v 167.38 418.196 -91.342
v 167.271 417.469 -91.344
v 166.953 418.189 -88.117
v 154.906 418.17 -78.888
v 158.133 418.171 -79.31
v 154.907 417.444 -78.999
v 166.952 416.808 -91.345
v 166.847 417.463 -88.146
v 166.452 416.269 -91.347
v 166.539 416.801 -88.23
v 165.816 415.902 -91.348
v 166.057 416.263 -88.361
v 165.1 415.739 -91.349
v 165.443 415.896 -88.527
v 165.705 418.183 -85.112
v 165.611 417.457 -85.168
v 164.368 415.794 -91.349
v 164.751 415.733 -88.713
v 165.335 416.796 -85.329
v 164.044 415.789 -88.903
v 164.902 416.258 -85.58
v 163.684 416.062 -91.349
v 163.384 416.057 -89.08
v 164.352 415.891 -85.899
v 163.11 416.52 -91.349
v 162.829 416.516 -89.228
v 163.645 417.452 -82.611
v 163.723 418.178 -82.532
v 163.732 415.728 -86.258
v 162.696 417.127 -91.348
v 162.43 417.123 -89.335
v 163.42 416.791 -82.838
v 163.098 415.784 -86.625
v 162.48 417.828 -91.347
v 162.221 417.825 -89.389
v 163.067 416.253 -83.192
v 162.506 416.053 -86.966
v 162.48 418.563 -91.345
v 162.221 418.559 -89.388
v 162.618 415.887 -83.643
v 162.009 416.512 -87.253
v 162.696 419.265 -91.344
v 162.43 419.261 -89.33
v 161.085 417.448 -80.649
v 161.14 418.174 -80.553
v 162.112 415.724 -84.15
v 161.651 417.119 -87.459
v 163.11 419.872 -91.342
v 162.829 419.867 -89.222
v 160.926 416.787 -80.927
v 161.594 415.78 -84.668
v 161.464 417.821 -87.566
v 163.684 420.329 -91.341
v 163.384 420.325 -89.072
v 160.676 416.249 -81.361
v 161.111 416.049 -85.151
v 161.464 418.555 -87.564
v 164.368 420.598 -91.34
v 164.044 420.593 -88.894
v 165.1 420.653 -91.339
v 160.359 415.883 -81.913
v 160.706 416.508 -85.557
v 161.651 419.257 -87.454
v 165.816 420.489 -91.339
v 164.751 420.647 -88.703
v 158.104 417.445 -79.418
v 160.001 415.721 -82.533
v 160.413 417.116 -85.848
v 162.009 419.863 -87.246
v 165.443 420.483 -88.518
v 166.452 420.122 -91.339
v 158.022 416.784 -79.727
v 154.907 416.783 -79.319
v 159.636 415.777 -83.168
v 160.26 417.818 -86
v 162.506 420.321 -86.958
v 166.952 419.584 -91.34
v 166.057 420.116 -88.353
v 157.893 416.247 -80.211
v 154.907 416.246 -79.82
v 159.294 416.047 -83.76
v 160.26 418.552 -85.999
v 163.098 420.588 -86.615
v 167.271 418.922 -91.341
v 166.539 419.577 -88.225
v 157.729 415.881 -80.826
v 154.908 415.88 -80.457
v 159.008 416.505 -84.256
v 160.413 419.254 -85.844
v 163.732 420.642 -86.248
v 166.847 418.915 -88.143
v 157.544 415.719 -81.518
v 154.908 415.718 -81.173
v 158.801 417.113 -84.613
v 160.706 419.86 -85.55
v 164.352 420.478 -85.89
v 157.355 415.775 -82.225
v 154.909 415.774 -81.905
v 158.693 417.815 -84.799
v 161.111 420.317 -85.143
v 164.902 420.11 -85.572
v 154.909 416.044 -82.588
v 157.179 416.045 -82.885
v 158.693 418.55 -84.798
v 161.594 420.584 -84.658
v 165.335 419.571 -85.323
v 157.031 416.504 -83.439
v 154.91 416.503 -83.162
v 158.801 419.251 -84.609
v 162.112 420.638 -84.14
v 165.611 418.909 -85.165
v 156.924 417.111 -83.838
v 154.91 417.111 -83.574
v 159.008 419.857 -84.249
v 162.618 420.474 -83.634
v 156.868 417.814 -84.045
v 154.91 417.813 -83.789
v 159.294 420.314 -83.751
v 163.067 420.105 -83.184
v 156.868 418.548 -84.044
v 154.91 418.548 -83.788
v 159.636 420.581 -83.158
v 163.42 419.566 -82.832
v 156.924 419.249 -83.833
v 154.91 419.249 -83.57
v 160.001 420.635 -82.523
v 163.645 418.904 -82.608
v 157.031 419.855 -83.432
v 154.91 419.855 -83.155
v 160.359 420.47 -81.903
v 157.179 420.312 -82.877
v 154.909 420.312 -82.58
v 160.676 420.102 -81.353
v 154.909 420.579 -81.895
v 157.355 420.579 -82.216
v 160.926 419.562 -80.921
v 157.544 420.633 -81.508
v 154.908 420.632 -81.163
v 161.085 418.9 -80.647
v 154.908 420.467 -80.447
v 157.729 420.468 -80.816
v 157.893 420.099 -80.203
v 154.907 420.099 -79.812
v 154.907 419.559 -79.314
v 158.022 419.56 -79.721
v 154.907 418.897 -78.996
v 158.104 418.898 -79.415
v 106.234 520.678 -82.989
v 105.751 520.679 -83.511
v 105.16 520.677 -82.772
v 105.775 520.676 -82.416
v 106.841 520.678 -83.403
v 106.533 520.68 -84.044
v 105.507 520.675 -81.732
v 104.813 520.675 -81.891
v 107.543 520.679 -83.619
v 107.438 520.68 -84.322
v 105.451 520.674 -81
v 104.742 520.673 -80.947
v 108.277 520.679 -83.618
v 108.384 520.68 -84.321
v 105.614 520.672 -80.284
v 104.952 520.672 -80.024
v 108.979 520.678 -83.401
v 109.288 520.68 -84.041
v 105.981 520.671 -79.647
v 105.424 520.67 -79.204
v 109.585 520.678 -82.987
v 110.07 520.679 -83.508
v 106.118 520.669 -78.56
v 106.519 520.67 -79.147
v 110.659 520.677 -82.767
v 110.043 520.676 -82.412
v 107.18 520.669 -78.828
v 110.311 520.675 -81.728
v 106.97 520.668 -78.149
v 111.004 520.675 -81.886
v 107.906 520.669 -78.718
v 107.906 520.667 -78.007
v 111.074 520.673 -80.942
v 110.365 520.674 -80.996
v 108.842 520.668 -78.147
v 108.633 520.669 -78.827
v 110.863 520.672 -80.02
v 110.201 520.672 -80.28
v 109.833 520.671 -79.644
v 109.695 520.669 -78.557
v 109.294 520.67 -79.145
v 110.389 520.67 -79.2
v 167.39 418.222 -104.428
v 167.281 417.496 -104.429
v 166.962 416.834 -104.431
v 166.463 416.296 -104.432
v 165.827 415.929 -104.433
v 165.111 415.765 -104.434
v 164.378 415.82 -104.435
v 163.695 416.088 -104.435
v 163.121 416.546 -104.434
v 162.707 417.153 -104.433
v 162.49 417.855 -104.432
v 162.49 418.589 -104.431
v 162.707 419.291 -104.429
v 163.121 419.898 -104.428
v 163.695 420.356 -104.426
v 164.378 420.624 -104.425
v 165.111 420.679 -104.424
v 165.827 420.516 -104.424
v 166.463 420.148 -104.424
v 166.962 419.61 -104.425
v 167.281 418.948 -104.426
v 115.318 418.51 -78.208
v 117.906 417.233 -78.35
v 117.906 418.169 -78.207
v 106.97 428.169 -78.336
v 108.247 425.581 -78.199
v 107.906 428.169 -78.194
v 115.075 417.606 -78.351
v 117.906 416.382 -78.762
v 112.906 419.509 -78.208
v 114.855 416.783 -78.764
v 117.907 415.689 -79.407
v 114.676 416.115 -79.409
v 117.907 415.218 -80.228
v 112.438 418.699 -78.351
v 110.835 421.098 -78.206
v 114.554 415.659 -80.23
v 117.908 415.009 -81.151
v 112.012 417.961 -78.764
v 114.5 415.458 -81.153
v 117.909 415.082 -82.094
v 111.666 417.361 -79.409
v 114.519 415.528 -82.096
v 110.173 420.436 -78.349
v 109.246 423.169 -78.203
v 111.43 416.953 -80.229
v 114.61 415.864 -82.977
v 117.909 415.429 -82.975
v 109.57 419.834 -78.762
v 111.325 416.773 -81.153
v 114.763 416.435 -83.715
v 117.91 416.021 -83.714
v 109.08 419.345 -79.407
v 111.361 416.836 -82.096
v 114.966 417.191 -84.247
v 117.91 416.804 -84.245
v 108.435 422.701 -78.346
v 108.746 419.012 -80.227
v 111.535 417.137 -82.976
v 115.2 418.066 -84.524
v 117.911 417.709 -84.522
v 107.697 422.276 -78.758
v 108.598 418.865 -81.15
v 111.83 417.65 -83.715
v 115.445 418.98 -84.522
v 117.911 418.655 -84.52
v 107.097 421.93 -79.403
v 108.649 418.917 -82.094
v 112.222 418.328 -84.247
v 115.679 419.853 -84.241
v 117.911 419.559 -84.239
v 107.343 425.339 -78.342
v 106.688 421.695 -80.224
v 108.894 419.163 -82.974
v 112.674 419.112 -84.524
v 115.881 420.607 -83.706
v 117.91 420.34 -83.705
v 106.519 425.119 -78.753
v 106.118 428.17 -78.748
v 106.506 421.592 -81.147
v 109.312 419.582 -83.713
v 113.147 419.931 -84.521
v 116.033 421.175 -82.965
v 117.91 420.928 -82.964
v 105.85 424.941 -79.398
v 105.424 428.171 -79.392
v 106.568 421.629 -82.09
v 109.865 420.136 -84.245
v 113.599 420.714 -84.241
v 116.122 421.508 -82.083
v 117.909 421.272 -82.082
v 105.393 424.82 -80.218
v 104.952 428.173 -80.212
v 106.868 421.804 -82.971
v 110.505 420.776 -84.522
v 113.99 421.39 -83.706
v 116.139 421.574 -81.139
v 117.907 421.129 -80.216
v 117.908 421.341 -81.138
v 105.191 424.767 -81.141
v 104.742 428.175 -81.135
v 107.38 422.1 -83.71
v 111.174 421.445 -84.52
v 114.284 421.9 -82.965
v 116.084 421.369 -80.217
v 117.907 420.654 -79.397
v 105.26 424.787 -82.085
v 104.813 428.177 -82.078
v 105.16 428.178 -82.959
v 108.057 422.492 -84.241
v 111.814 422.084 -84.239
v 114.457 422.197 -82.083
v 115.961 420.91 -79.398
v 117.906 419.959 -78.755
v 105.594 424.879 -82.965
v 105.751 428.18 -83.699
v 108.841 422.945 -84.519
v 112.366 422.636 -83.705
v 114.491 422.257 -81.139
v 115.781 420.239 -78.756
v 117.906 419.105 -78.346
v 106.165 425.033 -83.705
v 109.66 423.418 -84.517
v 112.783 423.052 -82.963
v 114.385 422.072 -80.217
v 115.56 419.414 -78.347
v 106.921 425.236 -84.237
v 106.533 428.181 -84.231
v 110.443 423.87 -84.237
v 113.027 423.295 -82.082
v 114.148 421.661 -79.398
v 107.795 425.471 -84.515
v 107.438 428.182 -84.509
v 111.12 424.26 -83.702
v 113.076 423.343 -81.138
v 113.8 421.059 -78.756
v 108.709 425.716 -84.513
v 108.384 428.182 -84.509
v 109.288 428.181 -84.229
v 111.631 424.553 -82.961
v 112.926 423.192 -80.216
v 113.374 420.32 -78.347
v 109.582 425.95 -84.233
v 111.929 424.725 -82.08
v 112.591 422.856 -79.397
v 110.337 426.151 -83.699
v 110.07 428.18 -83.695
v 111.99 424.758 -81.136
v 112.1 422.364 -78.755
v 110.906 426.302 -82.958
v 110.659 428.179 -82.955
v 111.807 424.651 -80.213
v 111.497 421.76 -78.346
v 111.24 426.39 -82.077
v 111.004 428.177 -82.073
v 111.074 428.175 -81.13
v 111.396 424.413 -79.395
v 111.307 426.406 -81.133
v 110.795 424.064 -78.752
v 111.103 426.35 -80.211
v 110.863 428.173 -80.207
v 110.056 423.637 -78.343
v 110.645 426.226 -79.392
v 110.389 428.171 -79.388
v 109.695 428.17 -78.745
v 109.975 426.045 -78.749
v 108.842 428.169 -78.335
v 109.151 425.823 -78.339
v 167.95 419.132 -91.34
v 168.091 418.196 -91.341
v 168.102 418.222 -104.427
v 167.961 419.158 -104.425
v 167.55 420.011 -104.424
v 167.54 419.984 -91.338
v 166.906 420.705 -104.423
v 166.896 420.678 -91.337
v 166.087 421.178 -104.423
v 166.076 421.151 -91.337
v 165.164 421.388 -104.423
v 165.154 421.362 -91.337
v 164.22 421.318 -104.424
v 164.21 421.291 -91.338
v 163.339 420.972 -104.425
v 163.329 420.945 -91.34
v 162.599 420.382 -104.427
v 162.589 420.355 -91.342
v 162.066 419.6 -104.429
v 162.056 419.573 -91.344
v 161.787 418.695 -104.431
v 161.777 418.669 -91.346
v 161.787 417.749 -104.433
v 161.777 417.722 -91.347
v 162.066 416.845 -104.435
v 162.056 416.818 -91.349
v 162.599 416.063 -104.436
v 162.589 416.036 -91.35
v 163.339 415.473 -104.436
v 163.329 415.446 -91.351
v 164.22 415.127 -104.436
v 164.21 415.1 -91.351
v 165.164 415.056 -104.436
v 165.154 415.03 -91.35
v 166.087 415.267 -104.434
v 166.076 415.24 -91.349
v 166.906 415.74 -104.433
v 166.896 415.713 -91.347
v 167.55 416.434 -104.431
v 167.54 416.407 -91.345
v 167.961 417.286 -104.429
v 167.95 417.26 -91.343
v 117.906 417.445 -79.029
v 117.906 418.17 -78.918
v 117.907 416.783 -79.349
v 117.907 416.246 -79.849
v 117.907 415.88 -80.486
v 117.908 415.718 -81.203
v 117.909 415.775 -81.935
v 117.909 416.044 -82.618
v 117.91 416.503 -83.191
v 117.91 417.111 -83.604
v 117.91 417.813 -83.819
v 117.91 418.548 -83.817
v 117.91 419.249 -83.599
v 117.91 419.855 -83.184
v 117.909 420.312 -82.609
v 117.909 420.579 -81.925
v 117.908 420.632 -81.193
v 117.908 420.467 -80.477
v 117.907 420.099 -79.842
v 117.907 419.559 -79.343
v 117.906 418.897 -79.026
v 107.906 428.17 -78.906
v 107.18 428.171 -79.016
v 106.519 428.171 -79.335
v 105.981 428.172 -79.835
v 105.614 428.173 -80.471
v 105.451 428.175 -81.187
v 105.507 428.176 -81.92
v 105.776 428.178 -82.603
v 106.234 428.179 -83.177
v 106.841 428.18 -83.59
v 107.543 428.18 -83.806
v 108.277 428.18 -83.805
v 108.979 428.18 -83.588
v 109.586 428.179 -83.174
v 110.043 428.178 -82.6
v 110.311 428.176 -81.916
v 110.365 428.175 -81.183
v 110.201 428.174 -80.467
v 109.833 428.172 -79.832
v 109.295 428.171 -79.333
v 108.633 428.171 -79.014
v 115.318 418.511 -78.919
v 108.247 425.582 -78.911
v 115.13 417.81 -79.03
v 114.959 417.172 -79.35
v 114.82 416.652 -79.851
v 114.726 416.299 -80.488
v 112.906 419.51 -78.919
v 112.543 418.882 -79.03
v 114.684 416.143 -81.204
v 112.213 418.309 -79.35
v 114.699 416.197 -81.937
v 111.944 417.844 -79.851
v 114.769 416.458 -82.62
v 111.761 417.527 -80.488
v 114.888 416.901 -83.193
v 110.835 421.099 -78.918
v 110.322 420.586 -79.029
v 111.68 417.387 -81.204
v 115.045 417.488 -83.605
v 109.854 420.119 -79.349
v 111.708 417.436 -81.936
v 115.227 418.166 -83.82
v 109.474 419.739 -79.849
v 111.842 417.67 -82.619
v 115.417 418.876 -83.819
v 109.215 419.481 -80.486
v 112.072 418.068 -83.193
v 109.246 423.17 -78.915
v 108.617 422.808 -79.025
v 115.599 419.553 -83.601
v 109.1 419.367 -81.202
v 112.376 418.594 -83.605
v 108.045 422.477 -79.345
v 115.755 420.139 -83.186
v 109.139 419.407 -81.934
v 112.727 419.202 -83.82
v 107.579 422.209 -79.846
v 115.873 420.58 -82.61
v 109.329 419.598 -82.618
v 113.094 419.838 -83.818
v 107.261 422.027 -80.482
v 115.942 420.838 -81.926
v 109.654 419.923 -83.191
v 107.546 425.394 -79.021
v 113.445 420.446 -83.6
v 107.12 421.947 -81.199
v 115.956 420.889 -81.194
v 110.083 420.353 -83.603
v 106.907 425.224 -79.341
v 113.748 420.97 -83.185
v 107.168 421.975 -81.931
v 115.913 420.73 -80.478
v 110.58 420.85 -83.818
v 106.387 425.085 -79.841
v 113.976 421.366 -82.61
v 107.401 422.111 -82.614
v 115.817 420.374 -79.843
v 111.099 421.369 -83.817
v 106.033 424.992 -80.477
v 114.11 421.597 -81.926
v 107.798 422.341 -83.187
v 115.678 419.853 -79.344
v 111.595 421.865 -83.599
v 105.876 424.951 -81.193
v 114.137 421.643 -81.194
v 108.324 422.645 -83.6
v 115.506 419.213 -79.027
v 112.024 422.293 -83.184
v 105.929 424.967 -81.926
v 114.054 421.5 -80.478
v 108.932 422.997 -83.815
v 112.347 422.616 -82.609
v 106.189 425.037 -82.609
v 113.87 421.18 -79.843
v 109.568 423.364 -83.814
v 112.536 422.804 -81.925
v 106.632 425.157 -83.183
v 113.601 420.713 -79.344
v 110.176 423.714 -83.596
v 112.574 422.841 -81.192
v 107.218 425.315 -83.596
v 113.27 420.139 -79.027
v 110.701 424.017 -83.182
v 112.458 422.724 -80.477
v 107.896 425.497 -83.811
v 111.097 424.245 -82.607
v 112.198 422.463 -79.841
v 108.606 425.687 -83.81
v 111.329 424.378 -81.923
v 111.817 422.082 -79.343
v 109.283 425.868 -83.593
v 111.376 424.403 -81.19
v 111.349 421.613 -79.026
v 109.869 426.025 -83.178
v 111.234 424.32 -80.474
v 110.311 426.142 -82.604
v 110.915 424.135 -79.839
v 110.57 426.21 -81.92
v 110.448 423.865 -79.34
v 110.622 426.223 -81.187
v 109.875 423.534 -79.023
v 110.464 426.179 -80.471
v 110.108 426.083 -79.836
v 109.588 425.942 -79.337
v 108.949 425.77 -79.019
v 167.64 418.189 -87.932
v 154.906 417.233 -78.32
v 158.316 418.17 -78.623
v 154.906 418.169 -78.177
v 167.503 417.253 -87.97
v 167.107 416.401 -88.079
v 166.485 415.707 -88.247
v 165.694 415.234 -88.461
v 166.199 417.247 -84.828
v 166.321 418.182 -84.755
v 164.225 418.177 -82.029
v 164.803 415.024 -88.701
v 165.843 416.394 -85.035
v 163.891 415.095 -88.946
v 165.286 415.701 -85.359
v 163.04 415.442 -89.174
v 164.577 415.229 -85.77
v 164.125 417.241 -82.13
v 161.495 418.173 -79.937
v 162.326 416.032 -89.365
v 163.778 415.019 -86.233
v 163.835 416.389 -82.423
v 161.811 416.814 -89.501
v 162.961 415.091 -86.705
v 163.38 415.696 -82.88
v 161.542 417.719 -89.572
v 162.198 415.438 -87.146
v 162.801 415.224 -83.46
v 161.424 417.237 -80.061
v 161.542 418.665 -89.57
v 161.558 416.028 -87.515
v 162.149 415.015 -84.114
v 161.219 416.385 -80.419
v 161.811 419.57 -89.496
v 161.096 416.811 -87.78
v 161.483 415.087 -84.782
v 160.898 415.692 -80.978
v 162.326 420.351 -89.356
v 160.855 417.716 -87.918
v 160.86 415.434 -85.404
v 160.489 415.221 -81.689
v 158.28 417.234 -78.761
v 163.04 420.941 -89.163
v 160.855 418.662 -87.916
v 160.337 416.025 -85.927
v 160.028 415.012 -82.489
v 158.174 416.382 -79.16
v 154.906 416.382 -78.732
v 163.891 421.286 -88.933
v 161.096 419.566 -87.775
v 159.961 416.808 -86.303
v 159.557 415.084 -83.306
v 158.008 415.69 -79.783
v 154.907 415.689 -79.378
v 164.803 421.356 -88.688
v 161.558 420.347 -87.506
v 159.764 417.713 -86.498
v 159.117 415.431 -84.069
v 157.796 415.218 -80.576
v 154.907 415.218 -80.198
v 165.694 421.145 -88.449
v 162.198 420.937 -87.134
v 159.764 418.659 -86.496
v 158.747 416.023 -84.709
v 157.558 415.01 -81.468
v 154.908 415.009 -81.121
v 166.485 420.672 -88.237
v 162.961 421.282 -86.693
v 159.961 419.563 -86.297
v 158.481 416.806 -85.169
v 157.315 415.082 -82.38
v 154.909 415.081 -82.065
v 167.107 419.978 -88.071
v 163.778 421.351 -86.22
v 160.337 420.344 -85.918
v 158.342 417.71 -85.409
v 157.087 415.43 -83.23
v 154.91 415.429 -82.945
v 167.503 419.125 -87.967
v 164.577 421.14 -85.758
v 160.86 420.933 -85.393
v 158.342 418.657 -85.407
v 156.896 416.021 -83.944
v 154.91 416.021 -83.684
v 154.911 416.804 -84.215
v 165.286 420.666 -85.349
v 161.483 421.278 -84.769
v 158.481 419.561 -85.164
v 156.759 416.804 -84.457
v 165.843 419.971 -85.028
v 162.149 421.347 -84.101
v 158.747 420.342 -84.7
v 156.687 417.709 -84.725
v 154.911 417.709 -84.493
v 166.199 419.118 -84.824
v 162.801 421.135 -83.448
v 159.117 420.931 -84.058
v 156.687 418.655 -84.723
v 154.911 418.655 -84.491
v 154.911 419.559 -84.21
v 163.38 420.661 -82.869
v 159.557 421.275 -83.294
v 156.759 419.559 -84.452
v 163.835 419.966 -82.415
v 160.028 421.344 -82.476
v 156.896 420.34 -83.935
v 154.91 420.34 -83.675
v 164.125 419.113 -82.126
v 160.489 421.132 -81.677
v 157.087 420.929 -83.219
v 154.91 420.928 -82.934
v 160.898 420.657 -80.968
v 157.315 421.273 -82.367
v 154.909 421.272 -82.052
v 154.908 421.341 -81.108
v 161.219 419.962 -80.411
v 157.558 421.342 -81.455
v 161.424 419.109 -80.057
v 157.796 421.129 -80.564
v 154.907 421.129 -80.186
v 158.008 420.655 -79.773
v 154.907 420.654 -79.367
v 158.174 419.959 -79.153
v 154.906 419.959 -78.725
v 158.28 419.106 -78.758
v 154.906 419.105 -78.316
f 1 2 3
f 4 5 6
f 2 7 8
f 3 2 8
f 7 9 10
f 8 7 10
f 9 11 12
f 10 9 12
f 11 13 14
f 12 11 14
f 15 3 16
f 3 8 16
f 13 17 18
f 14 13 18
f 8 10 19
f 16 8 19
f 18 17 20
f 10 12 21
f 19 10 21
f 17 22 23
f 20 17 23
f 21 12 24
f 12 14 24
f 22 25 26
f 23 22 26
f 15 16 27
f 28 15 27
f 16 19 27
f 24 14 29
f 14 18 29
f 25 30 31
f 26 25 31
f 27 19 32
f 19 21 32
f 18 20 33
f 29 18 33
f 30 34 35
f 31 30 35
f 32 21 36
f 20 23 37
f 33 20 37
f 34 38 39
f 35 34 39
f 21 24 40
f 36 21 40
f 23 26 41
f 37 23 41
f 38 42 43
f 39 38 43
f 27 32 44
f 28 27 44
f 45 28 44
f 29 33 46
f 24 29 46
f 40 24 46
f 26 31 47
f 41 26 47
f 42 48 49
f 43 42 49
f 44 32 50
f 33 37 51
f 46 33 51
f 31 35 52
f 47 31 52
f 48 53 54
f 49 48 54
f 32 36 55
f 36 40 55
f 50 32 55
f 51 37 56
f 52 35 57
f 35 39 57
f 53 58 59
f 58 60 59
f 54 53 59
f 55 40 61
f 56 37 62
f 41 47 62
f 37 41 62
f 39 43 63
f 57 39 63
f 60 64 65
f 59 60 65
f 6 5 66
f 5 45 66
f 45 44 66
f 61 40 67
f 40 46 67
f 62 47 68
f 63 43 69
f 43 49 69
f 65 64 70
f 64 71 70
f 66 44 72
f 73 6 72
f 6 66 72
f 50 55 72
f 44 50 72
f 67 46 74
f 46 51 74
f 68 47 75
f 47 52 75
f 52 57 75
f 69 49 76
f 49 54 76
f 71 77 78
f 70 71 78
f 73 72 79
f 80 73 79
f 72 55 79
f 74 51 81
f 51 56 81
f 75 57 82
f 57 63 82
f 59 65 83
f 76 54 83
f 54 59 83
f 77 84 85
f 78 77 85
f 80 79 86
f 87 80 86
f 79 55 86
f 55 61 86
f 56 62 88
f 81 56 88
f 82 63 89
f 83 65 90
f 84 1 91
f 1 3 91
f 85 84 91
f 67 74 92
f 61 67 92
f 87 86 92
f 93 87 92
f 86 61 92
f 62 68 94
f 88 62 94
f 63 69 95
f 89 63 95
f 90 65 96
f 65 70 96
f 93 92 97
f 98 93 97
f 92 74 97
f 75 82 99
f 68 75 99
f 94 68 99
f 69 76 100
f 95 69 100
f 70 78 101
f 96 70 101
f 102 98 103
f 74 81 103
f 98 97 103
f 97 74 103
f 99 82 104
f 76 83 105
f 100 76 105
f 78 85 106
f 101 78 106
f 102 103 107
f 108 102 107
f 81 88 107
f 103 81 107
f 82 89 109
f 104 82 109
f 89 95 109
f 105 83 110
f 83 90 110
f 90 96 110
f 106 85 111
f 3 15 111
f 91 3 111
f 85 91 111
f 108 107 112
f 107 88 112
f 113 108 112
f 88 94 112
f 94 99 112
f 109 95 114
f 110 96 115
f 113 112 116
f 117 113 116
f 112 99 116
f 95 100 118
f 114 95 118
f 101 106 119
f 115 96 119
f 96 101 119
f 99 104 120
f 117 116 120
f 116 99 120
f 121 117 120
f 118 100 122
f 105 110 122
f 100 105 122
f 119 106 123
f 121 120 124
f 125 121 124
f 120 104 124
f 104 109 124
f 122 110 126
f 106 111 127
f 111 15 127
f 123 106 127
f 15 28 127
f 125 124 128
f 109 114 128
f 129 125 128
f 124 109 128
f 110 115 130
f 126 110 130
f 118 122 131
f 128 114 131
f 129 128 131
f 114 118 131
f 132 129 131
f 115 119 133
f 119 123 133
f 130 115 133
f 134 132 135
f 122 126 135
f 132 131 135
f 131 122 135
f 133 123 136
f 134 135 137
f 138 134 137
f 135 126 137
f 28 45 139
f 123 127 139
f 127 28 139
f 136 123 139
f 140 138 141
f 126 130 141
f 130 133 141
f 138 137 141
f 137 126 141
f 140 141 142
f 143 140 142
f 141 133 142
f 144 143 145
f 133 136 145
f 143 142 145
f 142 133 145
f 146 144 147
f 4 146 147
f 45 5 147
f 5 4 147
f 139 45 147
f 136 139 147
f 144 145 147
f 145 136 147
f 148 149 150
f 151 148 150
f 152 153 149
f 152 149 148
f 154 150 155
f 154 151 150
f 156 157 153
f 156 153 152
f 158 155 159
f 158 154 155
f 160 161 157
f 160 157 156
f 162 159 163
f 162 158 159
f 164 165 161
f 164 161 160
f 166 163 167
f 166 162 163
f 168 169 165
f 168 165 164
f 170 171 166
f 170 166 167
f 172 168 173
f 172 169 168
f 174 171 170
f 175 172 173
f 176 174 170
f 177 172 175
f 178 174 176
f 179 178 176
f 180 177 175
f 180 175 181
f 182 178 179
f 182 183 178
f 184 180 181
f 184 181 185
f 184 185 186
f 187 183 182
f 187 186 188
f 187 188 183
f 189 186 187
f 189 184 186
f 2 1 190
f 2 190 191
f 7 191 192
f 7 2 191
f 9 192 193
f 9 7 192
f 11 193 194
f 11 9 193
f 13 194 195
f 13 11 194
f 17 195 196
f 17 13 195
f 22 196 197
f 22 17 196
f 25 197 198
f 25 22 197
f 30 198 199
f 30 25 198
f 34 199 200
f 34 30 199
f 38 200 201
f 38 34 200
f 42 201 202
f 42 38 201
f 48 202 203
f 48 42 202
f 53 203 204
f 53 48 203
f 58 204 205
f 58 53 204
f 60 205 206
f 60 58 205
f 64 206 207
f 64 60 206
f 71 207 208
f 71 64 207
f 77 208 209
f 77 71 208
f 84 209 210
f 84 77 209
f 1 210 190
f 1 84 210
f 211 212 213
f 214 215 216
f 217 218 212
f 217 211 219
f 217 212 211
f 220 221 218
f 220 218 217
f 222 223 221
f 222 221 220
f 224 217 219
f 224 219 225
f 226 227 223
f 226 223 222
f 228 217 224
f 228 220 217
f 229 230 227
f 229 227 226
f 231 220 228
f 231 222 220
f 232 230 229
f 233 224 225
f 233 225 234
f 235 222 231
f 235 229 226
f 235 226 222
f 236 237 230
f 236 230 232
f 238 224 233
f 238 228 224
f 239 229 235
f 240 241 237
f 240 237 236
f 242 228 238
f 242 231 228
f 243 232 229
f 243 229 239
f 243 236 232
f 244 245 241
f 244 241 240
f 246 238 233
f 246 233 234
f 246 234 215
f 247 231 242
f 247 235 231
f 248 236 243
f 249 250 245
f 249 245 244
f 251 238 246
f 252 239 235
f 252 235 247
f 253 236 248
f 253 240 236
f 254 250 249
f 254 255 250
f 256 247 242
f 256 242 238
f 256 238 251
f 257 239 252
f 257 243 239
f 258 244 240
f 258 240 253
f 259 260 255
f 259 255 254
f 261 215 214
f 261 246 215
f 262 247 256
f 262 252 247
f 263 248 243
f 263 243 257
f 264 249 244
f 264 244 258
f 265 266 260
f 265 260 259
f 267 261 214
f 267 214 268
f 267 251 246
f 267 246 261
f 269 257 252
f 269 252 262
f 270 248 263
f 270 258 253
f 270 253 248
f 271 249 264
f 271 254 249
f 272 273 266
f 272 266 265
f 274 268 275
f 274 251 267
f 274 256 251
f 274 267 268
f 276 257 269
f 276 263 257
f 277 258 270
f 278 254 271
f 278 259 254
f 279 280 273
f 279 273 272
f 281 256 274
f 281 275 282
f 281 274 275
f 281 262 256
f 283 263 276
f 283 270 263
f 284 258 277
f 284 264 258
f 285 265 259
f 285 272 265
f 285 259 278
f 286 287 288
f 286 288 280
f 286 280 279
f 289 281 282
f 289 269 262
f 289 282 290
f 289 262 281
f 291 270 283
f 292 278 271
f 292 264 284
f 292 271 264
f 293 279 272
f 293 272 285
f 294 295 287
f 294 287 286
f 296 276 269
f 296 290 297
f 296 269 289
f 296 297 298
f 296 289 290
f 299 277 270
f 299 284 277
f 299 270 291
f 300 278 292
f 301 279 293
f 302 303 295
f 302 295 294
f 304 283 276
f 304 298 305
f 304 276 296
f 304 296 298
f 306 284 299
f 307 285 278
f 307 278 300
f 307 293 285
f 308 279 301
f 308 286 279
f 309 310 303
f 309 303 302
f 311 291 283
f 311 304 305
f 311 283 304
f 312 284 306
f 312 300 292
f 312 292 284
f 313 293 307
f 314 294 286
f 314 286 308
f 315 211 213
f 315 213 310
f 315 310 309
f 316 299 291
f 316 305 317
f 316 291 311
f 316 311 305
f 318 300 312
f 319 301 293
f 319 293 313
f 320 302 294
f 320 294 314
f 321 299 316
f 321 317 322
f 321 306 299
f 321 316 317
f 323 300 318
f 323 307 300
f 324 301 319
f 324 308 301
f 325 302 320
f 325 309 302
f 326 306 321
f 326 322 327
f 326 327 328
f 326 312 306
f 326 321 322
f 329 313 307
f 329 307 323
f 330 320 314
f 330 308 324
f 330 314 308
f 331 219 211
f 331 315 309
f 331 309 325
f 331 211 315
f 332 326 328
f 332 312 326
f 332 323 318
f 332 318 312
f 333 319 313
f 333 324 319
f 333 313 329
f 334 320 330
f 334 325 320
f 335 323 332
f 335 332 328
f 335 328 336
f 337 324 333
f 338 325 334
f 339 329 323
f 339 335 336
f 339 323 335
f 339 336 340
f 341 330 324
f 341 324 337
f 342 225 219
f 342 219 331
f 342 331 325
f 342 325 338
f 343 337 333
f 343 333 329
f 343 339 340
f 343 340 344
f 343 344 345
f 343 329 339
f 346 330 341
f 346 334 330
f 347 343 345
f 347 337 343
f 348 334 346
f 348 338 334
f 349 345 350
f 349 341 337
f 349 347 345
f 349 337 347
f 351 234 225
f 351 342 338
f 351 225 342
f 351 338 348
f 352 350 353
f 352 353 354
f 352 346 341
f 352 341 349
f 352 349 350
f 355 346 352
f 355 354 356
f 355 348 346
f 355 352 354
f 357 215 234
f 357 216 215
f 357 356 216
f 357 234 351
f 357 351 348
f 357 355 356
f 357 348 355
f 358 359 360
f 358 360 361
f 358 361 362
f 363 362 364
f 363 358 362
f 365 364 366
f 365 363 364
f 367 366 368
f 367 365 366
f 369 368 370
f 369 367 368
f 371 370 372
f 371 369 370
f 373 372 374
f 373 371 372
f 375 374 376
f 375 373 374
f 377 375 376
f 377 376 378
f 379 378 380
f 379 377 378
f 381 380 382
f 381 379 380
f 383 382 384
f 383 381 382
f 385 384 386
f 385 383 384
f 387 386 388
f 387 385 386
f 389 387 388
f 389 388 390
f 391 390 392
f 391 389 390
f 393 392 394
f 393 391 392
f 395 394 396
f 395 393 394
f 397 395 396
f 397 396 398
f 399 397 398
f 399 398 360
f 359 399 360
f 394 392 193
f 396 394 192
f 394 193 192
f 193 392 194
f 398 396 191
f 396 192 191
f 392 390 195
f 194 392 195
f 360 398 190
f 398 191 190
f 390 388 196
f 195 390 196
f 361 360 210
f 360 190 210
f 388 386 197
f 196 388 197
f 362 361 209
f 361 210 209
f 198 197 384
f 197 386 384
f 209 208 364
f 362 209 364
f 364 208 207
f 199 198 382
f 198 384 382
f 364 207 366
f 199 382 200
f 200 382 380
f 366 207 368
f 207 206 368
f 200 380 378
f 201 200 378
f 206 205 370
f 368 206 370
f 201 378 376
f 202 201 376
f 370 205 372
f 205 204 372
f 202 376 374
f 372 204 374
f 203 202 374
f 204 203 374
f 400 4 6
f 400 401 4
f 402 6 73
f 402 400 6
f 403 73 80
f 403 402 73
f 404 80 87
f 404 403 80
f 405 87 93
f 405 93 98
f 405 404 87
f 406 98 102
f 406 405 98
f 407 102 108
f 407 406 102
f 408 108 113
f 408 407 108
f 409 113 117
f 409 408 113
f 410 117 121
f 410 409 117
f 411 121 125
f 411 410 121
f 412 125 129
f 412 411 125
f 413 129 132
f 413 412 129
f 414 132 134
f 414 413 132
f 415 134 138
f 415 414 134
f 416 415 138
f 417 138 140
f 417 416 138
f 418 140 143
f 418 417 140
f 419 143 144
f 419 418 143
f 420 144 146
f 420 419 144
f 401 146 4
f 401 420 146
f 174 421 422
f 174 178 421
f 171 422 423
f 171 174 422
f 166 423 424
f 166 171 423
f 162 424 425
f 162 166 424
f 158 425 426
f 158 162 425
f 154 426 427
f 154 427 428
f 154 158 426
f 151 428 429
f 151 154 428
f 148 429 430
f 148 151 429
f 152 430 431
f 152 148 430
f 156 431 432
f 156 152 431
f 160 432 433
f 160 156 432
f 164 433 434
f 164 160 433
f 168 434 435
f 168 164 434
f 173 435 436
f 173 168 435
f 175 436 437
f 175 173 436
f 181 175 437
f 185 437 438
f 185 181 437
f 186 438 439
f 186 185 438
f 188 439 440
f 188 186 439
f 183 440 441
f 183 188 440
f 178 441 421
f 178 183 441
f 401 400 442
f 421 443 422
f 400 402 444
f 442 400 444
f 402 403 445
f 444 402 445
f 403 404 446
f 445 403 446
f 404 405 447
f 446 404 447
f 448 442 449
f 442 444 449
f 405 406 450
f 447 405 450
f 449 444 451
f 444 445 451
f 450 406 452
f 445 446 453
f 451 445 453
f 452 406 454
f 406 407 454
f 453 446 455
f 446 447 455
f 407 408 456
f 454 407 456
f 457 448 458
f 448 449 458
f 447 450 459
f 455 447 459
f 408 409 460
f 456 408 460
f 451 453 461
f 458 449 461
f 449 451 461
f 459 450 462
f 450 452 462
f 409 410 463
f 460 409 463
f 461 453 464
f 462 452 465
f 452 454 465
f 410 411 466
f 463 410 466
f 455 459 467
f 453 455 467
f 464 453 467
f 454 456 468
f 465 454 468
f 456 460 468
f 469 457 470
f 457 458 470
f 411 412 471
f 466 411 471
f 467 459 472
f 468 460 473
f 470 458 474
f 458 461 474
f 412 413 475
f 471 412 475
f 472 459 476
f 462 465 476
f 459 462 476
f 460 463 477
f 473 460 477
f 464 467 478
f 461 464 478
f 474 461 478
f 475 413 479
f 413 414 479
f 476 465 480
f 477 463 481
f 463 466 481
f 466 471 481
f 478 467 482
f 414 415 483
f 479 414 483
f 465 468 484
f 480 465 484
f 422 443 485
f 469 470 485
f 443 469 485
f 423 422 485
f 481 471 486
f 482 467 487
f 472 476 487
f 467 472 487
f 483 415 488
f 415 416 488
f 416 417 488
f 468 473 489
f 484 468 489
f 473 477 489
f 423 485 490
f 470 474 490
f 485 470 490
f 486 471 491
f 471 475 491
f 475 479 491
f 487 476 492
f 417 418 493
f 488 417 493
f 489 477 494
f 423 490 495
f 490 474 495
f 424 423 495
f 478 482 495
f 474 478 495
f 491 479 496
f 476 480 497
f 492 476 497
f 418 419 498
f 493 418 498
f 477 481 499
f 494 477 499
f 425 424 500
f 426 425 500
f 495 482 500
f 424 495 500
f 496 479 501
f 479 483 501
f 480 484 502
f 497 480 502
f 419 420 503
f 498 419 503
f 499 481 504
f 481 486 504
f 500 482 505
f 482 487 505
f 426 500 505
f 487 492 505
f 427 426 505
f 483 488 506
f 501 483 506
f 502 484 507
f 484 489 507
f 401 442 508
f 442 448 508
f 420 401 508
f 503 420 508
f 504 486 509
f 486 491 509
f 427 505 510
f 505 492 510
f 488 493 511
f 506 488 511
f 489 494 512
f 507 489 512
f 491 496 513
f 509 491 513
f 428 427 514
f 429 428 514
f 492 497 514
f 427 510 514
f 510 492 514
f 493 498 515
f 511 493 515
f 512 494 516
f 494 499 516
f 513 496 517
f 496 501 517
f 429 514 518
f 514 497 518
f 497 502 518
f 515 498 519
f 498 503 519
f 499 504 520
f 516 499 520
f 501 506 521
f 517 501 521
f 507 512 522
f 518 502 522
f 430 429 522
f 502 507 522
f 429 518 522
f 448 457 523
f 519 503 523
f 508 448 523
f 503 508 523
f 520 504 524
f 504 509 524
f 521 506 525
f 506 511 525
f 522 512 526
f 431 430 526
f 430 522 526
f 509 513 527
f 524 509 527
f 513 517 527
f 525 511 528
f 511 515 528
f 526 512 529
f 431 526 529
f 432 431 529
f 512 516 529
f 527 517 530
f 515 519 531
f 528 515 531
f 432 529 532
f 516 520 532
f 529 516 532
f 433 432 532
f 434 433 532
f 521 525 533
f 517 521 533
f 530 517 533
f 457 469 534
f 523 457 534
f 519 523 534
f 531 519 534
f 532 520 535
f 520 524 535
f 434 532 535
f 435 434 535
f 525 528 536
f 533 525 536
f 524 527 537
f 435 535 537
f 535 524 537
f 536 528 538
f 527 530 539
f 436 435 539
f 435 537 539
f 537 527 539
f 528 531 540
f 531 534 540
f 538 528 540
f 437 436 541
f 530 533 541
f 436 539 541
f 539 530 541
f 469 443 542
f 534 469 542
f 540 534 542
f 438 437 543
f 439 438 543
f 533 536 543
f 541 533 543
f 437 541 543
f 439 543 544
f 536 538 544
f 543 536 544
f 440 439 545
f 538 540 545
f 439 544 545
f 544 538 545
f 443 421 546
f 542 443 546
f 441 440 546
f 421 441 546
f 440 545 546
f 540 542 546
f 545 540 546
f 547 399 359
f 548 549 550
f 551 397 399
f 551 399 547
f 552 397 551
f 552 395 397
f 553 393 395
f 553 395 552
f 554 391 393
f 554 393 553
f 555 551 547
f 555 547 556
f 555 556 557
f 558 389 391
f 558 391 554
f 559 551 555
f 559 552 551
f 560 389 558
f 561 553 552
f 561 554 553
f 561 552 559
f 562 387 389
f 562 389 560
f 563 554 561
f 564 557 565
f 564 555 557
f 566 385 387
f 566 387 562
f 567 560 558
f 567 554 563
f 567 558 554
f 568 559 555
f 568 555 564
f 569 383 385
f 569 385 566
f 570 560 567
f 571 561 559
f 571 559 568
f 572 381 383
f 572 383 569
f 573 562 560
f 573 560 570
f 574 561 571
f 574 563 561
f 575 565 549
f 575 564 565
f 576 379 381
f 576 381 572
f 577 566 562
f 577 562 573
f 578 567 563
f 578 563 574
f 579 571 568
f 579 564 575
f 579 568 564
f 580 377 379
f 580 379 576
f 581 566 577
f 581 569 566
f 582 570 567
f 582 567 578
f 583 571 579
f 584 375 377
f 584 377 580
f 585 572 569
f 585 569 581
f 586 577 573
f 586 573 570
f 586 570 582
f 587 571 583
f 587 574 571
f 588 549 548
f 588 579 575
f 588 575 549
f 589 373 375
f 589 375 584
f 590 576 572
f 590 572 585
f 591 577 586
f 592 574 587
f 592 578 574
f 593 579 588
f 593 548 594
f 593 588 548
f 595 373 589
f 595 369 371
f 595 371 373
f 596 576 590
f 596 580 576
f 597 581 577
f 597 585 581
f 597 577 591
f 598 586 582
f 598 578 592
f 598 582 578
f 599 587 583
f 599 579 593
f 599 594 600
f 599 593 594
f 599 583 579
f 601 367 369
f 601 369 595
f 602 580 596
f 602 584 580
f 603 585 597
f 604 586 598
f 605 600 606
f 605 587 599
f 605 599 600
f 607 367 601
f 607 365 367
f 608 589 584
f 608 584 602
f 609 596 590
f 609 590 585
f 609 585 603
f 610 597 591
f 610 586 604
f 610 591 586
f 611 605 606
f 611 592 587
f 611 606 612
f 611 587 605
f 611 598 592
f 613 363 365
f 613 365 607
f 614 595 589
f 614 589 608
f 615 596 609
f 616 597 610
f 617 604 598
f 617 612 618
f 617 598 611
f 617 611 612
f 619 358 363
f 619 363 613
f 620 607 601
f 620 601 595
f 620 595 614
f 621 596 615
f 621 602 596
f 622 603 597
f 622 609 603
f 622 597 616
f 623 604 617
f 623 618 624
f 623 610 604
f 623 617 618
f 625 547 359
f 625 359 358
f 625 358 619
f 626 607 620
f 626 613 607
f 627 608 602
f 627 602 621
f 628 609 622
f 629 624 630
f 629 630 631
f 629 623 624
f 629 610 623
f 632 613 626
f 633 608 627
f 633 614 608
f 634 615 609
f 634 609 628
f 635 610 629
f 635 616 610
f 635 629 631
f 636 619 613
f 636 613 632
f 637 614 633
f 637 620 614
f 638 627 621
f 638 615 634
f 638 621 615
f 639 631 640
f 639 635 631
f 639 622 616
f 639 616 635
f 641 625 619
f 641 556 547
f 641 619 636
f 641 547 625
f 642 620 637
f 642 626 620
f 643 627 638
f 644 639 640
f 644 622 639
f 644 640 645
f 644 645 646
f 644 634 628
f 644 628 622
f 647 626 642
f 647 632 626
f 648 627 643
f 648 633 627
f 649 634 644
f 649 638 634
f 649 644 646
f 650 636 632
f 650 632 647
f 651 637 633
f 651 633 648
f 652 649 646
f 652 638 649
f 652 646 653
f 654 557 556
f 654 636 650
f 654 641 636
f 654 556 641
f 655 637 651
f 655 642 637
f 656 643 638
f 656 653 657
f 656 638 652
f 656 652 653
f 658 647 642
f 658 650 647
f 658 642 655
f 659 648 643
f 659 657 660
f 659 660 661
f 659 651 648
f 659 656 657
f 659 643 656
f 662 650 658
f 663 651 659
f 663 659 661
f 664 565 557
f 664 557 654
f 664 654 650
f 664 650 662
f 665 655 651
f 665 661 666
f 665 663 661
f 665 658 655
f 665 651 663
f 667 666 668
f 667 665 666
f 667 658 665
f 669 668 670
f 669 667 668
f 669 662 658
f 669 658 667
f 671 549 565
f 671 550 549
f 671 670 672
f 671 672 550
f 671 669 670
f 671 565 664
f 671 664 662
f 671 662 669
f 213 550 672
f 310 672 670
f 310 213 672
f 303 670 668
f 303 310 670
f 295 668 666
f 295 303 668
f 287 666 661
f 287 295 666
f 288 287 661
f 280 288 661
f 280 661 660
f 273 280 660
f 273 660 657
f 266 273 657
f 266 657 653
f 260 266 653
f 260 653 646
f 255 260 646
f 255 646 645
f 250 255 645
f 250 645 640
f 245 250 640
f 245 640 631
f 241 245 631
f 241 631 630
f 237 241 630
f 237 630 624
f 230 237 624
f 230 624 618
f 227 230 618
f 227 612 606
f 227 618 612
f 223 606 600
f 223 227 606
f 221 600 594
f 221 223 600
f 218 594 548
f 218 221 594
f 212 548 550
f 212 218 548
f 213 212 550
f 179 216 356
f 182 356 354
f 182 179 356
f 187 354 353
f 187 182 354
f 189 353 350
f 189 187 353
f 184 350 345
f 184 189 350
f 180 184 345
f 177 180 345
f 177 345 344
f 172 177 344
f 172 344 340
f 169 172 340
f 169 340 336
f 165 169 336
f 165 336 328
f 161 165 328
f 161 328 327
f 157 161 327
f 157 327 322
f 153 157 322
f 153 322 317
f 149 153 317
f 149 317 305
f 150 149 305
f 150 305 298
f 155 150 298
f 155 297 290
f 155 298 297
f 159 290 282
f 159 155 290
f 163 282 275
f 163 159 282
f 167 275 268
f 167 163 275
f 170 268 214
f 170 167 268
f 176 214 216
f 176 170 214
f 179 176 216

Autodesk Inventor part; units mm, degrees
ref_plane "YZ Plane" through (0, 0, 0) normal (1, 0, 0) x (0, 1, 0)
ref_plane "XZ Plane" through (0, 0, 0) normal (0, 1, 0) x (-1, 0, 0)
ref_plane "Work Plane5" through (164.9267, 418.2222, -104.4295) normal (-0.0008, -0.002, 1) x (1, 0, 0.0008)
sketch "Sketch5" plane through (164.9267, 418.2222, -104.4295) normal (-0.0008, -0.002, 1) x (1, 0, 0.0008)
  circle A0 centre (0, 0) radius 3.175
  circle A1 centre (0, 0) radius 2.4638
sketch3d "3D Sketch3"
  line L0 (164.9267, 418.2222, -104.4295) -> (164.9163, 418.1957, -91.344)
  arc A0 (164.9163, 418.1957, -91.344) -> (154.9084, 418.1754, -81.3521) centre (154.9164, 418.1957, -91.352) ccw
  line L1 (154.9084, 418.1754, -81.3521) -> (117.9082, 418.1755, -81.3817)
  arc A1 (117.9082, 418.1755, -81.3817) -> (107.9083, 428.1753, -81.3694) centre (117.9082, 428.1753, -81.3614) ccw
  line L2 (107.9083, 428.1753, -81.3694) -> (107.9082, 520.6739, -81.182)
  dimension "d14" = 9.9999
  dimension "d15" = 9.9999
sweep "Sweep3" add profiles "Sketch5" path "3D Sketch3"
equation "\"OD\" = 6.35"
equation "\"t\" = 0.7112"
equation "\"L\" = PL"
equation "\"ID\" = 4.9276"
equation "\"PL\" = 173.99"
equation "\"D\" = 15.24"
equation "\"Size_Designation\" = 1.2345"
properties material "Stainless Steel"
